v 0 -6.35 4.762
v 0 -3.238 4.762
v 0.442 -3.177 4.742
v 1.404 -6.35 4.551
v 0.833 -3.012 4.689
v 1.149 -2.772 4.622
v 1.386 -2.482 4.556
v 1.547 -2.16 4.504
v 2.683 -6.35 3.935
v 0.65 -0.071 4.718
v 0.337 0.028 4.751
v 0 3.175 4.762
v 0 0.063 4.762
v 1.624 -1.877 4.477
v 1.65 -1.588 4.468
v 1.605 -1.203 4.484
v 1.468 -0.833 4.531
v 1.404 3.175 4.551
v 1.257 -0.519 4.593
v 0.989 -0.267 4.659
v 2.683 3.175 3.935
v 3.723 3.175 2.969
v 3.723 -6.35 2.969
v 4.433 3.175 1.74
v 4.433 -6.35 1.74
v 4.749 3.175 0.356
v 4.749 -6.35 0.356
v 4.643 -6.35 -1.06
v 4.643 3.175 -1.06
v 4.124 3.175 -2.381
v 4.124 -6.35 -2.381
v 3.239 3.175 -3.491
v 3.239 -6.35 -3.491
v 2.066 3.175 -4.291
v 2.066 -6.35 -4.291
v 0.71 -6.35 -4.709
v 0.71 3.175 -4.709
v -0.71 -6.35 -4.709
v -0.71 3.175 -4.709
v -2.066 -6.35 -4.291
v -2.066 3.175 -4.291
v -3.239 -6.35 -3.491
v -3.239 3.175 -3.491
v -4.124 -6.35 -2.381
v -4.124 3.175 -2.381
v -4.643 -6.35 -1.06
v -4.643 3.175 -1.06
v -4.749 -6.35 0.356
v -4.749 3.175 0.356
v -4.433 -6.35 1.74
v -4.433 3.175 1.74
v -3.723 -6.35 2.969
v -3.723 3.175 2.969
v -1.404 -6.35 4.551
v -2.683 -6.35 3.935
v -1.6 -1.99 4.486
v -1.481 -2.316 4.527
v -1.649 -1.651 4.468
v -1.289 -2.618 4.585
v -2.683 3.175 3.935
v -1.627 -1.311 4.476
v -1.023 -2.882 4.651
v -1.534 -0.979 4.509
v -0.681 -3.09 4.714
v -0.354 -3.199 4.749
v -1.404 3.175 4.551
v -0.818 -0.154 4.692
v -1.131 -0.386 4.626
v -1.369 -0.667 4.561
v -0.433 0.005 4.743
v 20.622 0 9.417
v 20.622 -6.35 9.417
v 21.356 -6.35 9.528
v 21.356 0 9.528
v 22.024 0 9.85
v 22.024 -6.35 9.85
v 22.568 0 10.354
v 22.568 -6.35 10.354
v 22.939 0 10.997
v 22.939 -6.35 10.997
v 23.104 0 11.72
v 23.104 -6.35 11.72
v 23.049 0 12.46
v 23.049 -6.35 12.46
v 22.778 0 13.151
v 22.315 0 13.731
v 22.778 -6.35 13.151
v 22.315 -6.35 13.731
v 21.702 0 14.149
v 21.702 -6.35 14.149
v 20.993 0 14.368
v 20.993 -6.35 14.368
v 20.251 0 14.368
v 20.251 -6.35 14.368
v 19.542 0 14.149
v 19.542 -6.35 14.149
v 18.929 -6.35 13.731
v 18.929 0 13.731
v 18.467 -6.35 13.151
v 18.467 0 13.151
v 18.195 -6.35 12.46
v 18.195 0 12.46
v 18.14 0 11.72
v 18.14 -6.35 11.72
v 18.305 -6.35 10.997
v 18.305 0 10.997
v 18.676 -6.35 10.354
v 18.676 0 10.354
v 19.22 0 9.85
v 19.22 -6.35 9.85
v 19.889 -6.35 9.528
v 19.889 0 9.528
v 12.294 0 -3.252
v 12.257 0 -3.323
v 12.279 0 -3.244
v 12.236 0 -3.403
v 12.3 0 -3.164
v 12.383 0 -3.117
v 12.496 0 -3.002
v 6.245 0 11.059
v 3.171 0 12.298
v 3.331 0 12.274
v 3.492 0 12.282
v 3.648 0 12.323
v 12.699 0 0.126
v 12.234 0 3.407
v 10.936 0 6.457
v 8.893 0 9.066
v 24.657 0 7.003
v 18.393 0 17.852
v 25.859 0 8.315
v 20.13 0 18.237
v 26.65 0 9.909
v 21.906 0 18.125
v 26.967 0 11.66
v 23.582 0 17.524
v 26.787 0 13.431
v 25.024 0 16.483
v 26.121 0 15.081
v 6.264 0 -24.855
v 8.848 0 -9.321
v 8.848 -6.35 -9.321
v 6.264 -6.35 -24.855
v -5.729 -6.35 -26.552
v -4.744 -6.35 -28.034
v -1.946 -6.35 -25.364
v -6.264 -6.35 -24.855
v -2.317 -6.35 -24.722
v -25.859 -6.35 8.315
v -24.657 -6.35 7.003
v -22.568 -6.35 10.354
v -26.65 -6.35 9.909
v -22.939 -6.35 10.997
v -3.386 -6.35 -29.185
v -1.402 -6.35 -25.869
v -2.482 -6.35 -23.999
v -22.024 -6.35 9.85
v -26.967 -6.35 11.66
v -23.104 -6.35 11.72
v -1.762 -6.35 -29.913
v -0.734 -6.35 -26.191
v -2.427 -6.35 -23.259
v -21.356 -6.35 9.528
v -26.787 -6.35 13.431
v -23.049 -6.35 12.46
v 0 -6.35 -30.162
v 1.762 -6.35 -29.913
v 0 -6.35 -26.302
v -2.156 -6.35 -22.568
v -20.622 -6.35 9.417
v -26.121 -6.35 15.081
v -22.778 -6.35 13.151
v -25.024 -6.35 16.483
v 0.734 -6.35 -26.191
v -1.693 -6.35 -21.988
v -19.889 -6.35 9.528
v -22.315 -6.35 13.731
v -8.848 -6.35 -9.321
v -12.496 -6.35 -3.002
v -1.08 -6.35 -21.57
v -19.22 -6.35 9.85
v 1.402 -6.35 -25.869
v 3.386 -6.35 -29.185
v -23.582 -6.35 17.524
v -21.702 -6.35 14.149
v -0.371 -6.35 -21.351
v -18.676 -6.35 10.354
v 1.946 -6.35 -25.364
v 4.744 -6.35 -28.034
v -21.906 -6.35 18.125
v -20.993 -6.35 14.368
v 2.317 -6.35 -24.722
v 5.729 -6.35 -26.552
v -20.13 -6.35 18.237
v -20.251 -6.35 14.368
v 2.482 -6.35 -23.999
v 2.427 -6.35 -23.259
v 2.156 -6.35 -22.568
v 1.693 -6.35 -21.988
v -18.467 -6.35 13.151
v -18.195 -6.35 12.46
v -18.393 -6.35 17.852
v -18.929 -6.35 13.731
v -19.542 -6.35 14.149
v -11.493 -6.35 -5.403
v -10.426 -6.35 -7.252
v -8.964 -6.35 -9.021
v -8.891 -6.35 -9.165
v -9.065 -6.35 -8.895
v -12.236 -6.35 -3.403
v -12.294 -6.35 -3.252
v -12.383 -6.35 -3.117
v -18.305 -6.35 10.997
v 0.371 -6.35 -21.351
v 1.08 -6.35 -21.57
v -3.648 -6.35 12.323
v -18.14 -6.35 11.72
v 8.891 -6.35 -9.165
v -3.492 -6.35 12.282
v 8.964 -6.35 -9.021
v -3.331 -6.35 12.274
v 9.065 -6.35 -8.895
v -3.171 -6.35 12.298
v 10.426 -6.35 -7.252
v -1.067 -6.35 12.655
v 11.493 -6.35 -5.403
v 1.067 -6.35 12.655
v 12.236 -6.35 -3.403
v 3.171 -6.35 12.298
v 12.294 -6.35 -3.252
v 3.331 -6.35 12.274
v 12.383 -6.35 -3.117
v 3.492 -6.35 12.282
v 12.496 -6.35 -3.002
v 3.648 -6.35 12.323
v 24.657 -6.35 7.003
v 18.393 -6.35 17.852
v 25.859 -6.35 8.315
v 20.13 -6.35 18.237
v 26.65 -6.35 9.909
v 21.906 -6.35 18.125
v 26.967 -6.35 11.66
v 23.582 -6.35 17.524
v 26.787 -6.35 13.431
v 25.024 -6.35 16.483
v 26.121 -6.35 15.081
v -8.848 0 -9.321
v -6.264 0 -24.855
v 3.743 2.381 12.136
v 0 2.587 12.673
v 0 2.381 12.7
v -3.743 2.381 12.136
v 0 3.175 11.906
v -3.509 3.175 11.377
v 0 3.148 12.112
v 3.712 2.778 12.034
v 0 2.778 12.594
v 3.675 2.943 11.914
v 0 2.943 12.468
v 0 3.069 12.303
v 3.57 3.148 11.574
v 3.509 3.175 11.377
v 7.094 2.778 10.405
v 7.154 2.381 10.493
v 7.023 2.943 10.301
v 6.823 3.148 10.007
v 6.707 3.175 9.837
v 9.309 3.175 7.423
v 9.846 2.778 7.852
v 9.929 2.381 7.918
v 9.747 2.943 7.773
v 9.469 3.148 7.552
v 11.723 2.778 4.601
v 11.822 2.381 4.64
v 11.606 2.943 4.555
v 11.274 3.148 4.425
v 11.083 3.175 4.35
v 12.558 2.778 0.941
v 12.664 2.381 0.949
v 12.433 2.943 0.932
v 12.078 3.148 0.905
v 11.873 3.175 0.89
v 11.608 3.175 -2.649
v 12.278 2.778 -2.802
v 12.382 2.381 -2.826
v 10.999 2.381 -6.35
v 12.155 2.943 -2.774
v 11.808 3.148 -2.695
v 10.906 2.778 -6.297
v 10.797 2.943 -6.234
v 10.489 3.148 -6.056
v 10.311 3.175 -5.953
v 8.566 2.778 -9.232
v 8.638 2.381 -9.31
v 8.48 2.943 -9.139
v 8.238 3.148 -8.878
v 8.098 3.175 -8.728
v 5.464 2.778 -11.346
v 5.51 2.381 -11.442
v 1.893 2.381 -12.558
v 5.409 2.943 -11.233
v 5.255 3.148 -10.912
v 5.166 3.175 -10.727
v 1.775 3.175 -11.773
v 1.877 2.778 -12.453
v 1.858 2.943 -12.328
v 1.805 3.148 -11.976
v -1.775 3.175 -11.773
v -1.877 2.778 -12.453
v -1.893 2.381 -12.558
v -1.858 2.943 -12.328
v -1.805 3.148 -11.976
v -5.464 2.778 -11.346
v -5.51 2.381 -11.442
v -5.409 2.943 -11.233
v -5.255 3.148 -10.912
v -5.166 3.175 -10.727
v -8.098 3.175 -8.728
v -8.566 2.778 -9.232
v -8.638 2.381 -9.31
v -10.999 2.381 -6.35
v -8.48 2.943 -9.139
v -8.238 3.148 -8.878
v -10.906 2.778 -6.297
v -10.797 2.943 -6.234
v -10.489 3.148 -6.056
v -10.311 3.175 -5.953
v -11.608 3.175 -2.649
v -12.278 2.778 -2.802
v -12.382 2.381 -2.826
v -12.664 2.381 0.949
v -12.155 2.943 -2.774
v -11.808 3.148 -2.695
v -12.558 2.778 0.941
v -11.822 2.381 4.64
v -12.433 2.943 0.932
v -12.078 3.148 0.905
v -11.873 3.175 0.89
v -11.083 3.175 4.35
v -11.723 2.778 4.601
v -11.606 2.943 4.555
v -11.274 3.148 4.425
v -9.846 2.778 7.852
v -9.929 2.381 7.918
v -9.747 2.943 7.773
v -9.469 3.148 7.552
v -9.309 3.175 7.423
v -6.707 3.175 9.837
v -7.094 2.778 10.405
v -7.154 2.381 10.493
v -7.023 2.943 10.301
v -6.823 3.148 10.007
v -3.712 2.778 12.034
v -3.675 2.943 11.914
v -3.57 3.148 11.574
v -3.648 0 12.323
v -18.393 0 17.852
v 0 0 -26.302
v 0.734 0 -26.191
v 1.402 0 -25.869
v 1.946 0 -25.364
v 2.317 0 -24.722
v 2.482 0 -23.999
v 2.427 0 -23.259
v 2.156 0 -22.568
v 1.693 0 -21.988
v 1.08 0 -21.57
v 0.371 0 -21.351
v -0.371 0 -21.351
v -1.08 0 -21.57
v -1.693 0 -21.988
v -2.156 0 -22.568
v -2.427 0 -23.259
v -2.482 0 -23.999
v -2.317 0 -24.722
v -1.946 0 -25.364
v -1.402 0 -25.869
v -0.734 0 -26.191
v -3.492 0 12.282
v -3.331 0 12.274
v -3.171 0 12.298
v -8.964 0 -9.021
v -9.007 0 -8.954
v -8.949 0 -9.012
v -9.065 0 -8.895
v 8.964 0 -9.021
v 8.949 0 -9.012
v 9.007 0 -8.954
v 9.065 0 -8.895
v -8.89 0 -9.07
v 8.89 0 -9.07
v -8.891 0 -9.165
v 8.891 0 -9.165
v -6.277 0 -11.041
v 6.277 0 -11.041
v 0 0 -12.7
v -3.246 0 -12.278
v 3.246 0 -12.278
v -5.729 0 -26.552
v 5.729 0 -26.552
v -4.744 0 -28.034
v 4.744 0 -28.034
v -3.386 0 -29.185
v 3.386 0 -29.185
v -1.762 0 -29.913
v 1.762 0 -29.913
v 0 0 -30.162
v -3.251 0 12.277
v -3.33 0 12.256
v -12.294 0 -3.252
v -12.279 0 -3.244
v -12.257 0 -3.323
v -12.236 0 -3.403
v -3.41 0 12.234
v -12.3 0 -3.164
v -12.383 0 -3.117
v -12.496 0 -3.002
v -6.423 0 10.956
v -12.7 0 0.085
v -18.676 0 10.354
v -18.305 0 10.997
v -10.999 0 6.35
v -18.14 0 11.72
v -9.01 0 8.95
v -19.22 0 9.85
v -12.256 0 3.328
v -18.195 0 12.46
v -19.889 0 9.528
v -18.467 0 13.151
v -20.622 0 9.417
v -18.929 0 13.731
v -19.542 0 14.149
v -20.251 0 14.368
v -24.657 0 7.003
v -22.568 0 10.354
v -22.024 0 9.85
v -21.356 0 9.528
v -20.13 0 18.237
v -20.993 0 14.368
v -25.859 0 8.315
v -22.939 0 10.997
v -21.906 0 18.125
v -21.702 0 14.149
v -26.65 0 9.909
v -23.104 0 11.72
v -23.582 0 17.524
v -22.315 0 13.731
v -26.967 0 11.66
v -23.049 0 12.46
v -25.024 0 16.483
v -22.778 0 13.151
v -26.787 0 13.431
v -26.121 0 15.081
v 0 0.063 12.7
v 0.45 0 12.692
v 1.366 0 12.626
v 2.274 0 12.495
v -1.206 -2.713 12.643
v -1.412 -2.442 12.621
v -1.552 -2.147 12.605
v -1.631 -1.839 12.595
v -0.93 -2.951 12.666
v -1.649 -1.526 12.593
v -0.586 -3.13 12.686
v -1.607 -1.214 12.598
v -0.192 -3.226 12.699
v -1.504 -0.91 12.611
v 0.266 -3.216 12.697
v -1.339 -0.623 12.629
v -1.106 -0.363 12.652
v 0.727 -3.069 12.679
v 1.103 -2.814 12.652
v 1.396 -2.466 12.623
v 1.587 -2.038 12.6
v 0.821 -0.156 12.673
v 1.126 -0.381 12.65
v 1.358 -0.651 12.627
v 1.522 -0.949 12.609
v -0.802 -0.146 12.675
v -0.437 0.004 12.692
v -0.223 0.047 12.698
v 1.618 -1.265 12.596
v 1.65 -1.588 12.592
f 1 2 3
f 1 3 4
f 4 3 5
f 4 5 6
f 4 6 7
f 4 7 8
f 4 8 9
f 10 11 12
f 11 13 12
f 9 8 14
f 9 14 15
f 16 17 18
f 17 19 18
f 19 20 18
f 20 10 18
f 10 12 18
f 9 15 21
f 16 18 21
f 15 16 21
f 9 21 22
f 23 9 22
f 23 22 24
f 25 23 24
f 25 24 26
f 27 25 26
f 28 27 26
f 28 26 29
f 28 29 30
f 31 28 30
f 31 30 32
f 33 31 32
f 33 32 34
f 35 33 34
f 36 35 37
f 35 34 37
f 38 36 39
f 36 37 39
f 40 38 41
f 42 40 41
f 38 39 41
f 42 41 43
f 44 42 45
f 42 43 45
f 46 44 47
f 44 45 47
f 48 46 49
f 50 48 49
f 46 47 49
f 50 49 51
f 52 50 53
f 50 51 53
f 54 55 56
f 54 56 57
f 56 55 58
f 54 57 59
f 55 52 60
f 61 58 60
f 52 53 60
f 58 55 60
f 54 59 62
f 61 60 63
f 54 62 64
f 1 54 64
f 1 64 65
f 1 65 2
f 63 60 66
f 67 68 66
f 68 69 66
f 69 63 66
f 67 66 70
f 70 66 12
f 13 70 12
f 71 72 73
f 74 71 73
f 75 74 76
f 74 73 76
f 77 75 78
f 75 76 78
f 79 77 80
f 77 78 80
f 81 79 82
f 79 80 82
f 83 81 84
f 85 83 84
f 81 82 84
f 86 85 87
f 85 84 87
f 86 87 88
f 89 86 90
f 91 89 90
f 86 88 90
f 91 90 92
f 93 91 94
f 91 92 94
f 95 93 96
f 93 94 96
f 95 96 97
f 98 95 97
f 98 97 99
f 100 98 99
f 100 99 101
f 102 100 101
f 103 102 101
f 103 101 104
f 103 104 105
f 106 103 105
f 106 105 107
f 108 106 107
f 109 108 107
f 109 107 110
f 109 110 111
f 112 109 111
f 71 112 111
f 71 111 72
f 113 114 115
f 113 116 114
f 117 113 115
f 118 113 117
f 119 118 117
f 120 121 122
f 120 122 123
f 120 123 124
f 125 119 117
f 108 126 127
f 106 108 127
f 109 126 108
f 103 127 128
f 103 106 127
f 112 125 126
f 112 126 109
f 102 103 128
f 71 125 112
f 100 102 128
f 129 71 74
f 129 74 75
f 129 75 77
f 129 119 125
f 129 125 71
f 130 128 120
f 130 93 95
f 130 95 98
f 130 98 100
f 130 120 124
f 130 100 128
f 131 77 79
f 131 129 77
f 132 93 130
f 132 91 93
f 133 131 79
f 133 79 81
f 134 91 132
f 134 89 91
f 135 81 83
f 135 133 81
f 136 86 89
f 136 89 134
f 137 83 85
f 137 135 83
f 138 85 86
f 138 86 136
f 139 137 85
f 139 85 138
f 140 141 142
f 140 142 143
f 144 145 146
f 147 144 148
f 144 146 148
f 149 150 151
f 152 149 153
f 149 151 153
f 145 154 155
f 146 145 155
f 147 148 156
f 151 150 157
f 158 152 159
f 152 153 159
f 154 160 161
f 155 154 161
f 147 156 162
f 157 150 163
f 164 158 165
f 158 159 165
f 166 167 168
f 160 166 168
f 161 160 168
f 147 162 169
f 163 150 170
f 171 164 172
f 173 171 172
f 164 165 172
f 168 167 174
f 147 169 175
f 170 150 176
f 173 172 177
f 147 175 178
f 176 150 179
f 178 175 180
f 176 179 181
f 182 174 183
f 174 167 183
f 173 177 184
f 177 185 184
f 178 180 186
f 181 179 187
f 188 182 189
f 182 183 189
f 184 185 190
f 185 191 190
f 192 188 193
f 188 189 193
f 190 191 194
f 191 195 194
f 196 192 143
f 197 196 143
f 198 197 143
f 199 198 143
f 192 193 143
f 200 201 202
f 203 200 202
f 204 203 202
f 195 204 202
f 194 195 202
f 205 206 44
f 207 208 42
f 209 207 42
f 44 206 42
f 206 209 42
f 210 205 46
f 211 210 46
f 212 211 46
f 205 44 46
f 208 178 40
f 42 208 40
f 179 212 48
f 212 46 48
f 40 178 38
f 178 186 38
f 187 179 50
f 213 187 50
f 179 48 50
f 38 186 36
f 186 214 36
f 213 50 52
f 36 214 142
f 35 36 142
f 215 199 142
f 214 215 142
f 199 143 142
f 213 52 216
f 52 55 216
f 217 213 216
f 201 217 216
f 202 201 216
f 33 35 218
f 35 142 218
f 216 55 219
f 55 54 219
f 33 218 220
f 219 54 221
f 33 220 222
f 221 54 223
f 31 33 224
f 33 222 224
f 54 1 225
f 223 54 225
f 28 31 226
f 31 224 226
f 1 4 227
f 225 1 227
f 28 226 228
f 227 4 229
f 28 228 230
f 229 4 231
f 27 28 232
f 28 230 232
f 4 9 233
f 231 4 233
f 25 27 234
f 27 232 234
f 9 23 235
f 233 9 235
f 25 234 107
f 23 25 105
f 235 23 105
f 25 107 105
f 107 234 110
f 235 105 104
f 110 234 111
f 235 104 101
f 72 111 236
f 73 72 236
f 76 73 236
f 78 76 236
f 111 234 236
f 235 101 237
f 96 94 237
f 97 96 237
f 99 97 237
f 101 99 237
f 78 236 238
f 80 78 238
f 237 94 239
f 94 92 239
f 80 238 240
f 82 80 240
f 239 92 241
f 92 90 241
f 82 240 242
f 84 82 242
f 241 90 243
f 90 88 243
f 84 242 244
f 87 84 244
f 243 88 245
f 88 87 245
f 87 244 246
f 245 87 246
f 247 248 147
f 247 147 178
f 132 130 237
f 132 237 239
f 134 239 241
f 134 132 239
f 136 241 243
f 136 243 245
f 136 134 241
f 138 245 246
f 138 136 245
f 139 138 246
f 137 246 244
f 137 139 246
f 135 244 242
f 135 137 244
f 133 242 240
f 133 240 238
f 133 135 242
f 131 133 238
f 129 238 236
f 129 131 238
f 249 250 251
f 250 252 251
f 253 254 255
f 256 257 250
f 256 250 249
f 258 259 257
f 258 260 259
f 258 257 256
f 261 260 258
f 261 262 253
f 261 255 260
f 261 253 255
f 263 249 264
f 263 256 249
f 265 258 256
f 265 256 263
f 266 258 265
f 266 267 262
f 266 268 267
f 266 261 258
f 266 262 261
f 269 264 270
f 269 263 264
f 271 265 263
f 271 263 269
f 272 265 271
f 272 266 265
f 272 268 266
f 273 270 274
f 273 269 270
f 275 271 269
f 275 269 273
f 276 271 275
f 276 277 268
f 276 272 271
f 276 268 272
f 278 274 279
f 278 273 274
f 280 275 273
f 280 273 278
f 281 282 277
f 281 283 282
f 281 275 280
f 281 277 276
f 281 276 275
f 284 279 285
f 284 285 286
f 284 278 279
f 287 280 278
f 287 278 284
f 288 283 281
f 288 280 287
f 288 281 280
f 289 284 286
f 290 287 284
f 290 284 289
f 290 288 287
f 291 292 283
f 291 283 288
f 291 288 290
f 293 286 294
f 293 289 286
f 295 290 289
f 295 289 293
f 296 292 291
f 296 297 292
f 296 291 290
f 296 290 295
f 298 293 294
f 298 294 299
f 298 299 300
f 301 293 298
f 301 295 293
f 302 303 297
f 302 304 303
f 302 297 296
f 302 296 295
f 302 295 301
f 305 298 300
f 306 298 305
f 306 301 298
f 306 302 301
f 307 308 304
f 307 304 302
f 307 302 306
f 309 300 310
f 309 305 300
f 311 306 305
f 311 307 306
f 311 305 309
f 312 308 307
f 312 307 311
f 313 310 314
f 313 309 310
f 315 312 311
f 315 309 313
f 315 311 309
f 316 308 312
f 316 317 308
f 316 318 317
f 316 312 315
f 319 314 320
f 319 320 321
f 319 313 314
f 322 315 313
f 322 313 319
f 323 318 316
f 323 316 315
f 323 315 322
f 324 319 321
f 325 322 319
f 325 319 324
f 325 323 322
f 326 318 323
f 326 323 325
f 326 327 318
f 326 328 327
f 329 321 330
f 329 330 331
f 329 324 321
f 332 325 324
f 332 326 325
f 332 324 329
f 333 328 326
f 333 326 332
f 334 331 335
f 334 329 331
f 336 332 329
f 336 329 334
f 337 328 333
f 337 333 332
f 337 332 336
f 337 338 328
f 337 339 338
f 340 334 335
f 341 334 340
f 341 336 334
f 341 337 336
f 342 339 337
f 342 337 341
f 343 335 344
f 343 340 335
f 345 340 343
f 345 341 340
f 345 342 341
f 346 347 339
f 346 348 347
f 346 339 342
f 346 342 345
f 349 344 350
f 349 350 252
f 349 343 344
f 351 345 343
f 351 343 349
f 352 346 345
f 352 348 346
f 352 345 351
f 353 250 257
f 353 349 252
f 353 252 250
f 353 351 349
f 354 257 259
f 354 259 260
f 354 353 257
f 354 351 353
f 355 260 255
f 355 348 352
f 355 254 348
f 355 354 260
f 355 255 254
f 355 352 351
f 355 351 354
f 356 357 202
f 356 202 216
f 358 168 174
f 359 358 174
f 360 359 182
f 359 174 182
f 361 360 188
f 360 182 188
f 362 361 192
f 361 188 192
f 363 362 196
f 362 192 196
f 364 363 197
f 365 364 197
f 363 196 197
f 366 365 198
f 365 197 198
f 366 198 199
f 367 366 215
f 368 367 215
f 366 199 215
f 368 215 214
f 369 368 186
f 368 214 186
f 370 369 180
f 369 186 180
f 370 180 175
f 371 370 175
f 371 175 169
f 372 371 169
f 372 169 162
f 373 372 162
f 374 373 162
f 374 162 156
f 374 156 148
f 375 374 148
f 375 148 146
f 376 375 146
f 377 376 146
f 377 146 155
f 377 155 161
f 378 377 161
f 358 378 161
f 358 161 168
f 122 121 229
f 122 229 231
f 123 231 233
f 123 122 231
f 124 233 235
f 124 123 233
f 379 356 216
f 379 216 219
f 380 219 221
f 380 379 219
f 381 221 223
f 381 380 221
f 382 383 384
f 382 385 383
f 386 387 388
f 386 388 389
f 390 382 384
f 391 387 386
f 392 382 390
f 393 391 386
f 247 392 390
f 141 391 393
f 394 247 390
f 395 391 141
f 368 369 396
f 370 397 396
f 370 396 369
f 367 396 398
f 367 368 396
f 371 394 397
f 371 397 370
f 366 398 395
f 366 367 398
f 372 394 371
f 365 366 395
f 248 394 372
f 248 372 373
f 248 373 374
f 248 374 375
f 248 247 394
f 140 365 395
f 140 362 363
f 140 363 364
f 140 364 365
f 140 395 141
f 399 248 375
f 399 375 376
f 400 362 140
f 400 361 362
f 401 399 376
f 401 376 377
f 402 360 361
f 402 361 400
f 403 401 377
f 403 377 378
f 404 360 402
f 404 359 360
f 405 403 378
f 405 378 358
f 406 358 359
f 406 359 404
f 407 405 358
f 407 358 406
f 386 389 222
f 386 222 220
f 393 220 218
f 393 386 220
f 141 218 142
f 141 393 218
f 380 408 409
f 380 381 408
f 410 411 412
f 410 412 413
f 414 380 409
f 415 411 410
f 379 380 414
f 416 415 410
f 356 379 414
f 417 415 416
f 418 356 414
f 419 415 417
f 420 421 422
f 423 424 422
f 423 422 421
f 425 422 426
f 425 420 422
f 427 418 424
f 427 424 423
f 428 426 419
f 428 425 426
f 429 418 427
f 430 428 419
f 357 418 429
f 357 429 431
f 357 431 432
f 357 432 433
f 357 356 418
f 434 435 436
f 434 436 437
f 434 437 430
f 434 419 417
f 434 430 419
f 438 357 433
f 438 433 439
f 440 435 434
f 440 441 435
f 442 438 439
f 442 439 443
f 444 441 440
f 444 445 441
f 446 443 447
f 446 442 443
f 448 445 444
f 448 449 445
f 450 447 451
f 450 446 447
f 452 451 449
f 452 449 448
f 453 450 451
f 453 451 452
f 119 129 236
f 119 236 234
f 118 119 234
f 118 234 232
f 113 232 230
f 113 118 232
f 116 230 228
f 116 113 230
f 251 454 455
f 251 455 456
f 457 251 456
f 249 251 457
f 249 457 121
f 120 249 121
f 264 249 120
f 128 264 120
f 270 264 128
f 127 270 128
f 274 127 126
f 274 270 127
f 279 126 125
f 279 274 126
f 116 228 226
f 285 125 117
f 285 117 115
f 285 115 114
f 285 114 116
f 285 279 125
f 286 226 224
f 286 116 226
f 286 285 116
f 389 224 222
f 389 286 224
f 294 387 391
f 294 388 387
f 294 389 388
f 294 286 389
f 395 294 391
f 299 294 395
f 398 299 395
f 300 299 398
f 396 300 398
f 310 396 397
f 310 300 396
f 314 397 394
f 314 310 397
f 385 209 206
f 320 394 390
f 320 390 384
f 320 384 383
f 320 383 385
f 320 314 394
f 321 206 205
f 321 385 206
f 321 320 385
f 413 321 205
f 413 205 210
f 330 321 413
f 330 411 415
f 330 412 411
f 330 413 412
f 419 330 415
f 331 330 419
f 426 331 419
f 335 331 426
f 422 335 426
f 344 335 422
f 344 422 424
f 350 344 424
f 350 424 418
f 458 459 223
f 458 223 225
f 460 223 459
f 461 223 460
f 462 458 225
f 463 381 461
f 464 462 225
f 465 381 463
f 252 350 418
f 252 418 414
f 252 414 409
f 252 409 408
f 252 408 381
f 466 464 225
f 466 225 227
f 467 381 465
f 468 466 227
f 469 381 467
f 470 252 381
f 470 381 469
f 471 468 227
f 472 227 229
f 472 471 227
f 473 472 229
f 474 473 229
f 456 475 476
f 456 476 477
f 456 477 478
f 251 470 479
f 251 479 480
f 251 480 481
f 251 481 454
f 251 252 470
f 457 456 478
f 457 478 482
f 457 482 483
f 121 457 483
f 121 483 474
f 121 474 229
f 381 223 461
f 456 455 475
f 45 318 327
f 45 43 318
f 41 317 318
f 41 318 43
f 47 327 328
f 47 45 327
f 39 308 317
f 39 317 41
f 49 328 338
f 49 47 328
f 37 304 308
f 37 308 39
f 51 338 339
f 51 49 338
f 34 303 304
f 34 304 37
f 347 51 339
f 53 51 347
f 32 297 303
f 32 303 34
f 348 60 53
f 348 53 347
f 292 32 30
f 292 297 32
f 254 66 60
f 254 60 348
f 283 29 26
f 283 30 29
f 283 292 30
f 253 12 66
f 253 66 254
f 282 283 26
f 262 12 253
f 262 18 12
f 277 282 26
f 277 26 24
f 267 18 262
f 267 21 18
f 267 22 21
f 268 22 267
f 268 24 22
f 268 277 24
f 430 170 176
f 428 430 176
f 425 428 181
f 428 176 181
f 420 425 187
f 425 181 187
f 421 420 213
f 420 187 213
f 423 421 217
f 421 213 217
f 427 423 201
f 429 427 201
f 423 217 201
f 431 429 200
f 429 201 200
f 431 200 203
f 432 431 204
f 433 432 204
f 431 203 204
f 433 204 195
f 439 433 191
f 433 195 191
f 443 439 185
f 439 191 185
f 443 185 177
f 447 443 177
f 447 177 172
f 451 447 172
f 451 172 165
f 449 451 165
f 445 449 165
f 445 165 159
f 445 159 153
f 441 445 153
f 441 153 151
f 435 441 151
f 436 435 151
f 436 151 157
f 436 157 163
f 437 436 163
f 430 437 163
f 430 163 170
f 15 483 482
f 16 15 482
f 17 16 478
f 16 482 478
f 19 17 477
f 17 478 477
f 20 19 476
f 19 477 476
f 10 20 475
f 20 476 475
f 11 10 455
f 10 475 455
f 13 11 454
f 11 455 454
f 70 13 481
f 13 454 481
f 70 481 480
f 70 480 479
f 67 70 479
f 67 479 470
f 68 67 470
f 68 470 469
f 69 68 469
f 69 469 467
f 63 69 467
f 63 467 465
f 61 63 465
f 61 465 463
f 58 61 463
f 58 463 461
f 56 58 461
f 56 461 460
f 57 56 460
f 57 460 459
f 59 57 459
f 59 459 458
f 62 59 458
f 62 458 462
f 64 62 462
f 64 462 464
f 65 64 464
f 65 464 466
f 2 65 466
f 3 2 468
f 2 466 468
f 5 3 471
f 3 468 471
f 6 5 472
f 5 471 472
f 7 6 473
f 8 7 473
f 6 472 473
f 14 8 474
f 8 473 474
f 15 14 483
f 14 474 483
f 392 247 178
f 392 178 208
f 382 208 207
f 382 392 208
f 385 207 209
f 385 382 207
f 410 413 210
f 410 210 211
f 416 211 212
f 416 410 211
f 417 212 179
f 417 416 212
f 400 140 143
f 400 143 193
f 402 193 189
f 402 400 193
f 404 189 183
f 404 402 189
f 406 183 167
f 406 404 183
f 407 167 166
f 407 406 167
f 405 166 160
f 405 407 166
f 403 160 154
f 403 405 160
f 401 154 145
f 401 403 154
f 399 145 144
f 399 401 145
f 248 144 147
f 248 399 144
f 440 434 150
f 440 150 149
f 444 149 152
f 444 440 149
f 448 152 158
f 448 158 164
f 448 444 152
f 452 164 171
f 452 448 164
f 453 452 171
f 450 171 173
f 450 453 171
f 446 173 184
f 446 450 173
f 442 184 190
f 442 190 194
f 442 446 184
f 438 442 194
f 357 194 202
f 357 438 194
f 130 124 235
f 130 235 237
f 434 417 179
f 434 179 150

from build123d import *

# Parameters (mm, degrees)
SKETCH1_R                        = 12.7
SKETCH1_R_2                      = 4.7625
BOSS_EXTRUDE1_DEPTH              = 6.35
BOSS_EXTRUDE2_START              = 3.175
SKETCH1_5_R                      = 12.7
SKETCH1_5_R_2                    = 4.7625
BOSS_EXTRUDE2_DEPTH              = 3.175
F_10_CLEARANCE_HOLE1_D           = 4.9784
TAP_DRILL_FOR_M4X0_7_TAP1_REACH  = 52.866
TAP_DRILL_FOR_M4X0_7_TAP1_BORE_R = 1.65
FILLET1_R                        = 0.79375


with BuildPart() as part:
    # Sketch1 → Boss-Extrude1 (new body)
    # profile 1 of 4: a face of its own
    with BuildSketch(Plane(origin=(0, 0, 0), x_dir=(1, 0, 0), z_dir=(0, 1, 0))):
        with BuildLine():
            ThreePointArc((6.263906023, 24.854604283), (0, 30.1625), (-6.263906023, 24.854604283))
            Line((-6.263906023, 24.854604283), (-8.89, 9.069614104))
            ThreePointArc((-8.89, 9.069614104), (0, 12.7), (8.89, 9.069614104))
            Line((8.89, 9.069614104), (6.263906023, 24.854604283))
        make_face()
    # profile 2 of 4: a face of its own
    with BuildSketch(Plane(origin=(0, 0, 0), x_dir=(1, 0, 0), z_dir=(0, 1, 0))):
        Circle(SKETCH1_R)
        with Locations(Location((0, 0, 0), (0, 0, 270))):
            Circle(SKETCH1_R_2, mode=Mode.SUBTRACT)
    # profile 3 of 4: a face of its own
    with BuildSketch(Plane(origin=(0, 0, 0), x_dir=(1, 0, 0), z_dir=(0, 1, 0))):
        with BuildLine():
            Line((24.656671722, -7.002600399), (12.299516217, 3.164158788))
            ThreePointArc((12.299516217, 3.164158788), (12.599481258, 1.594701233), (12.7, 0))
            ThreePointArc((12.7, 0), (10.114120228, -7.680792409), (3.409516217, -12.233772892))
            Line((3.409516217, -12.233772892), (18.392765699, -17.852003884))
            ThreePointArc((18.392765699, -17.852003884), (26.121491242, -15.08125), (24.656671722, -7.002600399))
        make_face()
    # profile 4 of 4: a face of its own
    with BuildSketch(Plane(origin=(0, 0, 0), x_dir=(1, 0, 0), z_dir=(0, 1, 0))):
        with BuildLine():
            ThreePointArc((-3.409516217, -12.233772892), (-10.998522628, -6.35), (-12.299516217, 3.164158788))
            Line((-12.299516217, 3.164158788), (-24.656671722, -7.002600399))
            ThreePointArc((-24.656671722, -7.002600399), (-26.121491242, -15.08125), (-18.392765699, -17.852003884))
            Line((-18.392765699, -17.852003884), (-3.409516217, -12.233772892))
        make_face()
    extrude(amount=-BOSS_EXTRUDE1_DEPTH)

    # Sketch1<5> → Boss-Extrude2 (add)
    with BuildSketch(Plane(origin=(0, 0, 0), x_dir=(1, 0, 0), z_dir=(0, 1, 0)).offset(BOSS_EXTRUDE2_START)):
        with Locations(Location((0, 0, 0), (0, 0, 270))):
            Circle(SKETCH1_5_R)
        with Locations(Location((0, 0, 0), (0, 0, 270))):
            Circle(SKETCH1_5_R_2, mode=Mode.SUBTRACT)
    extrude(amount=-BOSS_EXTRUDE2_DEPTH)

    # #10 Clearance Hole1 (through all)
    with Locations(Plane(origin=(0, 0, -23.8125), x_dir=(0, 0, 1), z_dir=(0, 1, 0))):
        with Locations((0, 0), (35.71875, 20.622229928), (35.71875, -20.622229928)):
            Hole(F_10_CLEARANCE_HOLE1_D / 2)

    # Tap Drill for M4x0.7 Tap1 bore (on position points) → Tap Drill for M4x0.7 Tap1 (cut, up to next)
    with BuildSketch(Plane(origin=(0, -1.5875, 12.7), x_dir=(1, 0, 0), z_dir=(0, 0, 1)), mode=Mode.PRIVATE) as tap_drill_for_m4x0_7_tap1_sk1:
        Circle(TAP_DRILL_FOR_M4X0_7_TAP1_BORE_R)
    tap_drill_for_m4x0_7_tap1_tool1 = extrude(tap_drill_for_m4x0_7_tap1_sk1.sketch, amount=-TAP_DRILL_FOR_M4X0_7_TAP1_REACH, mode=Mode.PRIVATE) & part.part
    add(tap_drill_for_m4x0_7_tap1_tool1.solids().sort_by_distance((0, -1.5875, 12.7))[0], mode=Mode.SUBTRACT)

    # Fillet1
    # the kernel refuses this fillet: 0.79375 mm, written as the material it adds along each edge
    with BuildSketch(Plane(origin=(8.89, 0, -9.069614104), x_dir=(0.7073032764952122, 0, 0.7069102312593428), z_dir=(0, -1, 0)), Plane(origin=(3.409516217, 0, 12.233772892), x_dir=(-0.9658538567133282, 0, 0.2590874899951552), z_dir=(0, -1, 0)), Plane(origin=(-12.299516217, 0, -3.164158788), x_dir=(0.2585505802181169, 0, -0.965997721254494), z_dir=(0, -1, 0))) as fillet1_piece_1:
        with BuildLine():
            CenterArc((0.254671056, -0.793712483), FILLET1_R, 90.557072072, 35.013262483)
            Line((-0.207054828, -0.148074604), (0, 0))
            ThreePointArc((0, 0), (0.123476876, -0.000600272), (0.246953752, 0))
        make_face()
    extrude(amount=6.35)
    with BuildSketch(Plane(origin=(12.299516217, 0, -3.164158788), x_dir=(-0.2585505802181021, 0, -0.9659977212544979), z_dir=(0, -1, 0)), Plane(origin=(-3.409516217, 0, 12.233772892), x_dir=(0.9658538567133268, 0, 0.2590874899951606), z_dir=(0, -1, 0)), Plane(origin=(-8.89, 0, -9.069614104), x_dir=(-0.7073032764952193, 0, 0.7069102312593356), z_dir=(0, -1, 0))) as fillet1_piece_2:
        with BuildLine():
            CenterArc((0.254671056, 0.793712483), FILLET1_R, 234.429665445, 35.013262483)
            Line((-0.207054828, 0.148074604), (0, 0))
            ThreePointArc((0, 0), (0.123476876, 0.000600272), (0.246953752, 0))
        make_face()
    extrude(amount=6.35)
    # the kernel refuses this fillet: 0.79375 mm, written as the material it takes off along each edge
    with BuildSketch(Plane(origin=(0, 3.175, 0), x_dir=(0, 0, 1), z_dir=(-1, 0, 0))) as fillet1_2_piece_1:
        with BuildLine():
            CenterArc((12.7 - FILLET1_R, -FILLET1_R), FILLET1_R, 0, 90)
            Line((12.7, -FILLET1_R), (12.7, 0))
            Line((12.7, 0), (12.7 - FILLET1_R, 0))
        make_face()
    revolve(axis=Axis((0, 3.175, 0), (0, 1, 0)), mode=Mode.SUBTRACT)


solid = part.part
